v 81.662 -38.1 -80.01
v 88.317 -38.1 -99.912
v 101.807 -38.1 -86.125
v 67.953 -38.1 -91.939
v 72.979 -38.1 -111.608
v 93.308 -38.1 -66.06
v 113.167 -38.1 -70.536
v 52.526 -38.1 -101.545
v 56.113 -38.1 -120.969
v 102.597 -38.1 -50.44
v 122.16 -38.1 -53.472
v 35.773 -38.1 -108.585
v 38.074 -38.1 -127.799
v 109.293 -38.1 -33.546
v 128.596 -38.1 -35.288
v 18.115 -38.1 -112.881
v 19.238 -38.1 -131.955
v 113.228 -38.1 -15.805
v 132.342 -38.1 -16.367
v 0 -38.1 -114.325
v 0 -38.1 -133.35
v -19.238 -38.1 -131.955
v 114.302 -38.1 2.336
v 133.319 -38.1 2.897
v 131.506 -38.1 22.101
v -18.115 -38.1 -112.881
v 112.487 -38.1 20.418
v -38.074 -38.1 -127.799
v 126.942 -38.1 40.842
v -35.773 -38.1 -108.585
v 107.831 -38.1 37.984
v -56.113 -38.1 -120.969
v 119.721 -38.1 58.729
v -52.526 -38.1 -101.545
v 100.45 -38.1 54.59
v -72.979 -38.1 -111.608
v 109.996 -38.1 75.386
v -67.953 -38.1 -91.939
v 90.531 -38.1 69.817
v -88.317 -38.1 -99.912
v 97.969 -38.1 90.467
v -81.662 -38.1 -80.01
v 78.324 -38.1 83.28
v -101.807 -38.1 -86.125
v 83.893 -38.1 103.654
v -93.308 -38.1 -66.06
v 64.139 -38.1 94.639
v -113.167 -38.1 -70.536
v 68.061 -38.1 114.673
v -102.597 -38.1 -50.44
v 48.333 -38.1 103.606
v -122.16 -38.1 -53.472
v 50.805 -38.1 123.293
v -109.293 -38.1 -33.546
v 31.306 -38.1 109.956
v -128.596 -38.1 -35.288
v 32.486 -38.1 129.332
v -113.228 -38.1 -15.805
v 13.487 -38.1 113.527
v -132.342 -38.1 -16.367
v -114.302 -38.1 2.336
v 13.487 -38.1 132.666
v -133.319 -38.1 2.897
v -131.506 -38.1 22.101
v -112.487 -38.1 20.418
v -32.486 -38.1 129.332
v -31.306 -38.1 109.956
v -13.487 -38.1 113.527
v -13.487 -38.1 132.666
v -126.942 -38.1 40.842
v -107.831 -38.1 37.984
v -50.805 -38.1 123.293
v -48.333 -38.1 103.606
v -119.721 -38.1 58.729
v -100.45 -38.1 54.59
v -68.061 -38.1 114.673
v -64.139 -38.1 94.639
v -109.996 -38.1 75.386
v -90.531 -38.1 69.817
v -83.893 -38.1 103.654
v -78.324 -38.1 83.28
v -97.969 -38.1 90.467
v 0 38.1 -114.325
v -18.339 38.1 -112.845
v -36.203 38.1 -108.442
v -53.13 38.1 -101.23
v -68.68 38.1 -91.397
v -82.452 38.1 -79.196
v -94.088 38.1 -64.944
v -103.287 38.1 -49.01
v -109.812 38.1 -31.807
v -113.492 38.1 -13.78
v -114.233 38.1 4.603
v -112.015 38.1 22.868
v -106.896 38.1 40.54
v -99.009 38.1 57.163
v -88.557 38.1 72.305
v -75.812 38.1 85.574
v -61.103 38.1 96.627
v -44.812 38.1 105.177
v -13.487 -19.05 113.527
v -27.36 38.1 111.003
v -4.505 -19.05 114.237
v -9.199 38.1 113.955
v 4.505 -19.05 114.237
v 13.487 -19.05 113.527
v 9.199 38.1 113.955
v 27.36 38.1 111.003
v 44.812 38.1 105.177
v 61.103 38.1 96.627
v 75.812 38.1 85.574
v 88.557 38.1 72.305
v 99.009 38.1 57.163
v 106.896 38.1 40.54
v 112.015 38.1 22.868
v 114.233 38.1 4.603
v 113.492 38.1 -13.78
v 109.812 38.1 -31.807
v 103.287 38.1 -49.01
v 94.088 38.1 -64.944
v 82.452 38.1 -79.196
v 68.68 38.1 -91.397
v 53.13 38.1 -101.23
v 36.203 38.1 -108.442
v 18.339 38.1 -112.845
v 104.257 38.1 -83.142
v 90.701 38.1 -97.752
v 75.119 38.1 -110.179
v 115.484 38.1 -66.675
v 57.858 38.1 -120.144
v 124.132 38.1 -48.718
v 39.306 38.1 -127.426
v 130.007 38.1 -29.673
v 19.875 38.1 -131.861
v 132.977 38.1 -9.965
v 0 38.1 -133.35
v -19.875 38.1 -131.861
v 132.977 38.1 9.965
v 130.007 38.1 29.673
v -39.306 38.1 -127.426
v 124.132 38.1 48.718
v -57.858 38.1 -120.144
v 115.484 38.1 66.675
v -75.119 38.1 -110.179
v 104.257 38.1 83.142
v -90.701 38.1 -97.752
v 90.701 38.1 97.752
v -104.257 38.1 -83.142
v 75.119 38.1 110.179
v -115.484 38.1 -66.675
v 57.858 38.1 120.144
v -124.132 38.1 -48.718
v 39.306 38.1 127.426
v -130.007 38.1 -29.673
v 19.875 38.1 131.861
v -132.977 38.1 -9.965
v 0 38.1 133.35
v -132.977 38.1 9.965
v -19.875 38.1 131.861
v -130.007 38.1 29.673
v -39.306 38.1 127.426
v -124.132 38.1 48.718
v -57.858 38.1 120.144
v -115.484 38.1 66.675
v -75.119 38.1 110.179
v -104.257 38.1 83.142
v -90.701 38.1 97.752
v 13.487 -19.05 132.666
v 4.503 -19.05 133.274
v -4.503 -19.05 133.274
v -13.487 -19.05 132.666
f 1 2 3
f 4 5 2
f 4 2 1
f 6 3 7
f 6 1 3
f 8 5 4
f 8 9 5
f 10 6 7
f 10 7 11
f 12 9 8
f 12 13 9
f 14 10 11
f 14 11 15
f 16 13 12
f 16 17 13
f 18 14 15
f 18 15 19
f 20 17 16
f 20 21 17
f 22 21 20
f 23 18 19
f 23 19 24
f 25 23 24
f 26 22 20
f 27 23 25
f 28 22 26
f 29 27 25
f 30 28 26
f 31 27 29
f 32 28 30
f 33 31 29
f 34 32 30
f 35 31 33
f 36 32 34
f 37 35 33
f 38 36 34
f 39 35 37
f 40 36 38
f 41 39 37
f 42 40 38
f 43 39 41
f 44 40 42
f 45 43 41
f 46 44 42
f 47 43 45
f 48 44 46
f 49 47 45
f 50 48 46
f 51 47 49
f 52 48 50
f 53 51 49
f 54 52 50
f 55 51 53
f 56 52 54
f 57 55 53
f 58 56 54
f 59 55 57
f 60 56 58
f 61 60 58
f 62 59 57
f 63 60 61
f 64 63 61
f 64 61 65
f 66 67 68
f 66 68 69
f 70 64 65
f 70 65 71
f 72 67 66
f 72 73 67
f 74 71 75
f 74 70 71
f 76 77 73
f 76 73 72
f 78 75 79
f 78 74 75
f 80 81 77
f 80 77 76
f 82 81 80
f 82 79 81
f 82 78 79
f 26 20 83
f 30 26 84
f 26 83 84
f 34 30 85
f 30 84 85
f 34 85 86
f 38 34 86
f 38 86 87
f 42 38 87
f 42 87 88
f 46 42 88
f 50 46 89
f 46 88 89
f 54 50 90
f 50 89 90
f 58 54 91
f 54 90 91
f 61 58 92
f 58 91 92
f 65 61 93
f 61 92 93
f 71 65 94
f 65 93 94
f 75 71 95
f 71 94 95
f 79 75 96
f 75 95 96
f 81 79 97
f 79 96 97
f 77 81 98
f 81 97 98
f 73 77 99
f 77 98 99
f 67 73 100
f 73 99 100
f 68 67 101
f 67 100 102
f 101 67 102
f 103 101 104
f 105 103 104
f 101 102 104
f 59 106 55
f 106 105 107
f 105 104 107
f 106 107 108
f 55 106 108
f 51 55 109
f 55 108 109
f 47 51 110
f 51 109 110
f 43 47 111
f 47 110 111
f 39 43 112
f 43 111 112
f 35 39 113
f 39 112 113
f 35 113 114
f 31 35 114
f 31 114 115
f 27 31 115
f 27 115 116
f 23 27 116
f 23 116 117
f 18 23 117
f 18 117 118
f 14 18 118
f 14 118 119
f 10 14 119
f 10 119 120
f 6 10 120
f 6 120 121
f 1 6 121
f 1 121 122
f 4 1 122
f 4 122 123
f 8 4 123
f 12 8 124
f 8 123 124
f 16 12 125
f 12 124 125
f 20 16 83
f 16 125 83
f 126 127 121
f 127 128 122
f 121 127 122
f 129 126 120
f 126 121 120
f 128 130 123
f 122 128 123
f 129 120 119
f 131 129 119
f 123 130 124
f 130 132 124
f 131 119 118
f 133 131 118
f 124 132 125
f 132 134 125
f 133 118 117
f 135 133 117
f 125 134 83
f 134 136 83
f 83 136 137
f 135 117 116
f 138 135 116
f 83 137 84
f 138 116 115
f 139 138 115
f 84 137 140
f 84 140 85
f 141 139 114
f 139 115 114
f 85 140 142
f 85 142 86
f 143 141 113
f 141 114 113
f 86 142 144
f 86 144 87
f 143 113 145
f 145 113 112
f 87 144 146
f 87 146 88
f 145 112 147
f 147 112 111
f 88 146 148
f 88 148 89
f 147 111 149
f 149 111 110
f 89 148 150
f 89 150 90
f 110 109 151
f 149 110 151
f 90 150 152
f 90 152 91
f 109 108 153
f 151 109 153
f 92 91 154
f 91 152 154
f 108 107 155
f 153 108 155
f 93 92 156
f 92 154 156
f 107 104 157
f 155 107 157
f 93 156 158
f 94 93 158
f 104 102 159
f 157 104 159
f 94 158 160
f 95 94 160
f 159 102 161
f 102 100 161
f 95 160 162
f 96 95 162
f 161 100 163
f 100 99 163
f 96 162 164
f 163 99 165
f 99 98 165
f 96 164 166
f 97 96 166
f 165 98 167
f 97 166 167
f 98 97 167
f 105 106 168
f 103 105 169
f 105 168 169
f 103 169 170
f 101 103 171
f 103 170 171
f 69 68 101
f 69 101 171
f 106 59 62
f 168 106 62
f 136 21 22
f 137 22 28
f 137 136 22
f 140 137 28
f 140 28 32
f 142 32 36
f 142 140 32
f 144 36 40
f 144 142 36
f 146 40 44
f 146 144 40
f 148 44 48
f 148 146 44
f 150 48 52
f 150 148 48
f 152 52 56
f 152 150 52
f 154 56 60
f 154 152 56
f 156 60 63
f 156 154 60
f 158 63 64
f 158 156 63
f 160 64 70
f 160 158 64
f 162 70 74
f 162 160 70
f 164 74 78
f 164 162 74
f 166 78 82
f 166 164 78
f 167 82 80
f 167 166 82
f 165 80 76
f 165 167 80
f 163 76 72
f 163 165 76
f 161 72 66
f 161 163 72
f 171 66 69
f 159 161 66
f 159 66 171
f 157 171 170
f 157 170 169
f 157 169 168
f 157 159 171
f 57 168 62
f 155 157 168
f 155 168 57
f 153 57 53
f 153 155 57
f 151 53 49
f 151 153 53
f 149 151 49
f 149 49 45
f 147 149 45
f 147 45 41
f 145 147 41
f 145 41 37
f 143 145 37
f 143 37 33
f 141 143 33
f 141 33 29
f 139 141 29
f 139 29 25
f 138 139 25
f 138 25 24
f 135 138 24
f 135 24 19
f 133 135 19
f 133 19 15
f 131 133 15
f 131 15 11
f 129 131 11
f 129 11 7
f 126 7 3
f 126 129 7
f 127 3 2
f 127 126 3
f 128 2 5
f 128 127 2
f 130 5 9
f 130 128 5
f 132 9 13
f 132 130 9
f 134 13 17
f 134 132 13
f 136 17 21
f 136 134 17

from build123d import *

# Parameters (mm, degrees)
SKETCH1_W          = 76.2
SKETCH1_H          = 19.0246
CUT_EXTRUDE2_START = -38.1
SKETCH2_W          = 26.9748
SKETCH2_H          = 266.7
CUT_EXTRUDE2_DEPTH = 19.05


with BuildPart() as part:
    # Sketch1 → Revolve1 (revolve)
    with BuildSketch(Plane(origin=(0, 0, 0), x_dir=(0, 1, 0), z_dir=(0, 0, 1)), mode=Mode.PRIVATE) as revolve1_sk:
        with Locations((0, 123.8377)):
            Rectangle(SKETCH1_W, SKETCH1_H)
    revolve(revolve1_sk.sketch.rotate(Axis((0, -63.5, 0), (0, 1, 0)), 270), axis=Axis((0, -63.5, 0), (0, 1, 0)))

    # Sketch2 → Cut-Extrude2 (cut)
    with BuildSketch(Plane(origin=(0, 0, 0), x_dir=(-1, 0, 0), z_dir=(0, 1, 0)).offset(CUT_EXTRUDE2_START)):
        with Locations((0, 133.35)):
            Rectangle(SKETCH2_W, SKETCH2_H)
    extrude(amount=CUT_EXTRUDE2_DEPTH, mode=Mode.SUBTRACT)


solid = part.part
